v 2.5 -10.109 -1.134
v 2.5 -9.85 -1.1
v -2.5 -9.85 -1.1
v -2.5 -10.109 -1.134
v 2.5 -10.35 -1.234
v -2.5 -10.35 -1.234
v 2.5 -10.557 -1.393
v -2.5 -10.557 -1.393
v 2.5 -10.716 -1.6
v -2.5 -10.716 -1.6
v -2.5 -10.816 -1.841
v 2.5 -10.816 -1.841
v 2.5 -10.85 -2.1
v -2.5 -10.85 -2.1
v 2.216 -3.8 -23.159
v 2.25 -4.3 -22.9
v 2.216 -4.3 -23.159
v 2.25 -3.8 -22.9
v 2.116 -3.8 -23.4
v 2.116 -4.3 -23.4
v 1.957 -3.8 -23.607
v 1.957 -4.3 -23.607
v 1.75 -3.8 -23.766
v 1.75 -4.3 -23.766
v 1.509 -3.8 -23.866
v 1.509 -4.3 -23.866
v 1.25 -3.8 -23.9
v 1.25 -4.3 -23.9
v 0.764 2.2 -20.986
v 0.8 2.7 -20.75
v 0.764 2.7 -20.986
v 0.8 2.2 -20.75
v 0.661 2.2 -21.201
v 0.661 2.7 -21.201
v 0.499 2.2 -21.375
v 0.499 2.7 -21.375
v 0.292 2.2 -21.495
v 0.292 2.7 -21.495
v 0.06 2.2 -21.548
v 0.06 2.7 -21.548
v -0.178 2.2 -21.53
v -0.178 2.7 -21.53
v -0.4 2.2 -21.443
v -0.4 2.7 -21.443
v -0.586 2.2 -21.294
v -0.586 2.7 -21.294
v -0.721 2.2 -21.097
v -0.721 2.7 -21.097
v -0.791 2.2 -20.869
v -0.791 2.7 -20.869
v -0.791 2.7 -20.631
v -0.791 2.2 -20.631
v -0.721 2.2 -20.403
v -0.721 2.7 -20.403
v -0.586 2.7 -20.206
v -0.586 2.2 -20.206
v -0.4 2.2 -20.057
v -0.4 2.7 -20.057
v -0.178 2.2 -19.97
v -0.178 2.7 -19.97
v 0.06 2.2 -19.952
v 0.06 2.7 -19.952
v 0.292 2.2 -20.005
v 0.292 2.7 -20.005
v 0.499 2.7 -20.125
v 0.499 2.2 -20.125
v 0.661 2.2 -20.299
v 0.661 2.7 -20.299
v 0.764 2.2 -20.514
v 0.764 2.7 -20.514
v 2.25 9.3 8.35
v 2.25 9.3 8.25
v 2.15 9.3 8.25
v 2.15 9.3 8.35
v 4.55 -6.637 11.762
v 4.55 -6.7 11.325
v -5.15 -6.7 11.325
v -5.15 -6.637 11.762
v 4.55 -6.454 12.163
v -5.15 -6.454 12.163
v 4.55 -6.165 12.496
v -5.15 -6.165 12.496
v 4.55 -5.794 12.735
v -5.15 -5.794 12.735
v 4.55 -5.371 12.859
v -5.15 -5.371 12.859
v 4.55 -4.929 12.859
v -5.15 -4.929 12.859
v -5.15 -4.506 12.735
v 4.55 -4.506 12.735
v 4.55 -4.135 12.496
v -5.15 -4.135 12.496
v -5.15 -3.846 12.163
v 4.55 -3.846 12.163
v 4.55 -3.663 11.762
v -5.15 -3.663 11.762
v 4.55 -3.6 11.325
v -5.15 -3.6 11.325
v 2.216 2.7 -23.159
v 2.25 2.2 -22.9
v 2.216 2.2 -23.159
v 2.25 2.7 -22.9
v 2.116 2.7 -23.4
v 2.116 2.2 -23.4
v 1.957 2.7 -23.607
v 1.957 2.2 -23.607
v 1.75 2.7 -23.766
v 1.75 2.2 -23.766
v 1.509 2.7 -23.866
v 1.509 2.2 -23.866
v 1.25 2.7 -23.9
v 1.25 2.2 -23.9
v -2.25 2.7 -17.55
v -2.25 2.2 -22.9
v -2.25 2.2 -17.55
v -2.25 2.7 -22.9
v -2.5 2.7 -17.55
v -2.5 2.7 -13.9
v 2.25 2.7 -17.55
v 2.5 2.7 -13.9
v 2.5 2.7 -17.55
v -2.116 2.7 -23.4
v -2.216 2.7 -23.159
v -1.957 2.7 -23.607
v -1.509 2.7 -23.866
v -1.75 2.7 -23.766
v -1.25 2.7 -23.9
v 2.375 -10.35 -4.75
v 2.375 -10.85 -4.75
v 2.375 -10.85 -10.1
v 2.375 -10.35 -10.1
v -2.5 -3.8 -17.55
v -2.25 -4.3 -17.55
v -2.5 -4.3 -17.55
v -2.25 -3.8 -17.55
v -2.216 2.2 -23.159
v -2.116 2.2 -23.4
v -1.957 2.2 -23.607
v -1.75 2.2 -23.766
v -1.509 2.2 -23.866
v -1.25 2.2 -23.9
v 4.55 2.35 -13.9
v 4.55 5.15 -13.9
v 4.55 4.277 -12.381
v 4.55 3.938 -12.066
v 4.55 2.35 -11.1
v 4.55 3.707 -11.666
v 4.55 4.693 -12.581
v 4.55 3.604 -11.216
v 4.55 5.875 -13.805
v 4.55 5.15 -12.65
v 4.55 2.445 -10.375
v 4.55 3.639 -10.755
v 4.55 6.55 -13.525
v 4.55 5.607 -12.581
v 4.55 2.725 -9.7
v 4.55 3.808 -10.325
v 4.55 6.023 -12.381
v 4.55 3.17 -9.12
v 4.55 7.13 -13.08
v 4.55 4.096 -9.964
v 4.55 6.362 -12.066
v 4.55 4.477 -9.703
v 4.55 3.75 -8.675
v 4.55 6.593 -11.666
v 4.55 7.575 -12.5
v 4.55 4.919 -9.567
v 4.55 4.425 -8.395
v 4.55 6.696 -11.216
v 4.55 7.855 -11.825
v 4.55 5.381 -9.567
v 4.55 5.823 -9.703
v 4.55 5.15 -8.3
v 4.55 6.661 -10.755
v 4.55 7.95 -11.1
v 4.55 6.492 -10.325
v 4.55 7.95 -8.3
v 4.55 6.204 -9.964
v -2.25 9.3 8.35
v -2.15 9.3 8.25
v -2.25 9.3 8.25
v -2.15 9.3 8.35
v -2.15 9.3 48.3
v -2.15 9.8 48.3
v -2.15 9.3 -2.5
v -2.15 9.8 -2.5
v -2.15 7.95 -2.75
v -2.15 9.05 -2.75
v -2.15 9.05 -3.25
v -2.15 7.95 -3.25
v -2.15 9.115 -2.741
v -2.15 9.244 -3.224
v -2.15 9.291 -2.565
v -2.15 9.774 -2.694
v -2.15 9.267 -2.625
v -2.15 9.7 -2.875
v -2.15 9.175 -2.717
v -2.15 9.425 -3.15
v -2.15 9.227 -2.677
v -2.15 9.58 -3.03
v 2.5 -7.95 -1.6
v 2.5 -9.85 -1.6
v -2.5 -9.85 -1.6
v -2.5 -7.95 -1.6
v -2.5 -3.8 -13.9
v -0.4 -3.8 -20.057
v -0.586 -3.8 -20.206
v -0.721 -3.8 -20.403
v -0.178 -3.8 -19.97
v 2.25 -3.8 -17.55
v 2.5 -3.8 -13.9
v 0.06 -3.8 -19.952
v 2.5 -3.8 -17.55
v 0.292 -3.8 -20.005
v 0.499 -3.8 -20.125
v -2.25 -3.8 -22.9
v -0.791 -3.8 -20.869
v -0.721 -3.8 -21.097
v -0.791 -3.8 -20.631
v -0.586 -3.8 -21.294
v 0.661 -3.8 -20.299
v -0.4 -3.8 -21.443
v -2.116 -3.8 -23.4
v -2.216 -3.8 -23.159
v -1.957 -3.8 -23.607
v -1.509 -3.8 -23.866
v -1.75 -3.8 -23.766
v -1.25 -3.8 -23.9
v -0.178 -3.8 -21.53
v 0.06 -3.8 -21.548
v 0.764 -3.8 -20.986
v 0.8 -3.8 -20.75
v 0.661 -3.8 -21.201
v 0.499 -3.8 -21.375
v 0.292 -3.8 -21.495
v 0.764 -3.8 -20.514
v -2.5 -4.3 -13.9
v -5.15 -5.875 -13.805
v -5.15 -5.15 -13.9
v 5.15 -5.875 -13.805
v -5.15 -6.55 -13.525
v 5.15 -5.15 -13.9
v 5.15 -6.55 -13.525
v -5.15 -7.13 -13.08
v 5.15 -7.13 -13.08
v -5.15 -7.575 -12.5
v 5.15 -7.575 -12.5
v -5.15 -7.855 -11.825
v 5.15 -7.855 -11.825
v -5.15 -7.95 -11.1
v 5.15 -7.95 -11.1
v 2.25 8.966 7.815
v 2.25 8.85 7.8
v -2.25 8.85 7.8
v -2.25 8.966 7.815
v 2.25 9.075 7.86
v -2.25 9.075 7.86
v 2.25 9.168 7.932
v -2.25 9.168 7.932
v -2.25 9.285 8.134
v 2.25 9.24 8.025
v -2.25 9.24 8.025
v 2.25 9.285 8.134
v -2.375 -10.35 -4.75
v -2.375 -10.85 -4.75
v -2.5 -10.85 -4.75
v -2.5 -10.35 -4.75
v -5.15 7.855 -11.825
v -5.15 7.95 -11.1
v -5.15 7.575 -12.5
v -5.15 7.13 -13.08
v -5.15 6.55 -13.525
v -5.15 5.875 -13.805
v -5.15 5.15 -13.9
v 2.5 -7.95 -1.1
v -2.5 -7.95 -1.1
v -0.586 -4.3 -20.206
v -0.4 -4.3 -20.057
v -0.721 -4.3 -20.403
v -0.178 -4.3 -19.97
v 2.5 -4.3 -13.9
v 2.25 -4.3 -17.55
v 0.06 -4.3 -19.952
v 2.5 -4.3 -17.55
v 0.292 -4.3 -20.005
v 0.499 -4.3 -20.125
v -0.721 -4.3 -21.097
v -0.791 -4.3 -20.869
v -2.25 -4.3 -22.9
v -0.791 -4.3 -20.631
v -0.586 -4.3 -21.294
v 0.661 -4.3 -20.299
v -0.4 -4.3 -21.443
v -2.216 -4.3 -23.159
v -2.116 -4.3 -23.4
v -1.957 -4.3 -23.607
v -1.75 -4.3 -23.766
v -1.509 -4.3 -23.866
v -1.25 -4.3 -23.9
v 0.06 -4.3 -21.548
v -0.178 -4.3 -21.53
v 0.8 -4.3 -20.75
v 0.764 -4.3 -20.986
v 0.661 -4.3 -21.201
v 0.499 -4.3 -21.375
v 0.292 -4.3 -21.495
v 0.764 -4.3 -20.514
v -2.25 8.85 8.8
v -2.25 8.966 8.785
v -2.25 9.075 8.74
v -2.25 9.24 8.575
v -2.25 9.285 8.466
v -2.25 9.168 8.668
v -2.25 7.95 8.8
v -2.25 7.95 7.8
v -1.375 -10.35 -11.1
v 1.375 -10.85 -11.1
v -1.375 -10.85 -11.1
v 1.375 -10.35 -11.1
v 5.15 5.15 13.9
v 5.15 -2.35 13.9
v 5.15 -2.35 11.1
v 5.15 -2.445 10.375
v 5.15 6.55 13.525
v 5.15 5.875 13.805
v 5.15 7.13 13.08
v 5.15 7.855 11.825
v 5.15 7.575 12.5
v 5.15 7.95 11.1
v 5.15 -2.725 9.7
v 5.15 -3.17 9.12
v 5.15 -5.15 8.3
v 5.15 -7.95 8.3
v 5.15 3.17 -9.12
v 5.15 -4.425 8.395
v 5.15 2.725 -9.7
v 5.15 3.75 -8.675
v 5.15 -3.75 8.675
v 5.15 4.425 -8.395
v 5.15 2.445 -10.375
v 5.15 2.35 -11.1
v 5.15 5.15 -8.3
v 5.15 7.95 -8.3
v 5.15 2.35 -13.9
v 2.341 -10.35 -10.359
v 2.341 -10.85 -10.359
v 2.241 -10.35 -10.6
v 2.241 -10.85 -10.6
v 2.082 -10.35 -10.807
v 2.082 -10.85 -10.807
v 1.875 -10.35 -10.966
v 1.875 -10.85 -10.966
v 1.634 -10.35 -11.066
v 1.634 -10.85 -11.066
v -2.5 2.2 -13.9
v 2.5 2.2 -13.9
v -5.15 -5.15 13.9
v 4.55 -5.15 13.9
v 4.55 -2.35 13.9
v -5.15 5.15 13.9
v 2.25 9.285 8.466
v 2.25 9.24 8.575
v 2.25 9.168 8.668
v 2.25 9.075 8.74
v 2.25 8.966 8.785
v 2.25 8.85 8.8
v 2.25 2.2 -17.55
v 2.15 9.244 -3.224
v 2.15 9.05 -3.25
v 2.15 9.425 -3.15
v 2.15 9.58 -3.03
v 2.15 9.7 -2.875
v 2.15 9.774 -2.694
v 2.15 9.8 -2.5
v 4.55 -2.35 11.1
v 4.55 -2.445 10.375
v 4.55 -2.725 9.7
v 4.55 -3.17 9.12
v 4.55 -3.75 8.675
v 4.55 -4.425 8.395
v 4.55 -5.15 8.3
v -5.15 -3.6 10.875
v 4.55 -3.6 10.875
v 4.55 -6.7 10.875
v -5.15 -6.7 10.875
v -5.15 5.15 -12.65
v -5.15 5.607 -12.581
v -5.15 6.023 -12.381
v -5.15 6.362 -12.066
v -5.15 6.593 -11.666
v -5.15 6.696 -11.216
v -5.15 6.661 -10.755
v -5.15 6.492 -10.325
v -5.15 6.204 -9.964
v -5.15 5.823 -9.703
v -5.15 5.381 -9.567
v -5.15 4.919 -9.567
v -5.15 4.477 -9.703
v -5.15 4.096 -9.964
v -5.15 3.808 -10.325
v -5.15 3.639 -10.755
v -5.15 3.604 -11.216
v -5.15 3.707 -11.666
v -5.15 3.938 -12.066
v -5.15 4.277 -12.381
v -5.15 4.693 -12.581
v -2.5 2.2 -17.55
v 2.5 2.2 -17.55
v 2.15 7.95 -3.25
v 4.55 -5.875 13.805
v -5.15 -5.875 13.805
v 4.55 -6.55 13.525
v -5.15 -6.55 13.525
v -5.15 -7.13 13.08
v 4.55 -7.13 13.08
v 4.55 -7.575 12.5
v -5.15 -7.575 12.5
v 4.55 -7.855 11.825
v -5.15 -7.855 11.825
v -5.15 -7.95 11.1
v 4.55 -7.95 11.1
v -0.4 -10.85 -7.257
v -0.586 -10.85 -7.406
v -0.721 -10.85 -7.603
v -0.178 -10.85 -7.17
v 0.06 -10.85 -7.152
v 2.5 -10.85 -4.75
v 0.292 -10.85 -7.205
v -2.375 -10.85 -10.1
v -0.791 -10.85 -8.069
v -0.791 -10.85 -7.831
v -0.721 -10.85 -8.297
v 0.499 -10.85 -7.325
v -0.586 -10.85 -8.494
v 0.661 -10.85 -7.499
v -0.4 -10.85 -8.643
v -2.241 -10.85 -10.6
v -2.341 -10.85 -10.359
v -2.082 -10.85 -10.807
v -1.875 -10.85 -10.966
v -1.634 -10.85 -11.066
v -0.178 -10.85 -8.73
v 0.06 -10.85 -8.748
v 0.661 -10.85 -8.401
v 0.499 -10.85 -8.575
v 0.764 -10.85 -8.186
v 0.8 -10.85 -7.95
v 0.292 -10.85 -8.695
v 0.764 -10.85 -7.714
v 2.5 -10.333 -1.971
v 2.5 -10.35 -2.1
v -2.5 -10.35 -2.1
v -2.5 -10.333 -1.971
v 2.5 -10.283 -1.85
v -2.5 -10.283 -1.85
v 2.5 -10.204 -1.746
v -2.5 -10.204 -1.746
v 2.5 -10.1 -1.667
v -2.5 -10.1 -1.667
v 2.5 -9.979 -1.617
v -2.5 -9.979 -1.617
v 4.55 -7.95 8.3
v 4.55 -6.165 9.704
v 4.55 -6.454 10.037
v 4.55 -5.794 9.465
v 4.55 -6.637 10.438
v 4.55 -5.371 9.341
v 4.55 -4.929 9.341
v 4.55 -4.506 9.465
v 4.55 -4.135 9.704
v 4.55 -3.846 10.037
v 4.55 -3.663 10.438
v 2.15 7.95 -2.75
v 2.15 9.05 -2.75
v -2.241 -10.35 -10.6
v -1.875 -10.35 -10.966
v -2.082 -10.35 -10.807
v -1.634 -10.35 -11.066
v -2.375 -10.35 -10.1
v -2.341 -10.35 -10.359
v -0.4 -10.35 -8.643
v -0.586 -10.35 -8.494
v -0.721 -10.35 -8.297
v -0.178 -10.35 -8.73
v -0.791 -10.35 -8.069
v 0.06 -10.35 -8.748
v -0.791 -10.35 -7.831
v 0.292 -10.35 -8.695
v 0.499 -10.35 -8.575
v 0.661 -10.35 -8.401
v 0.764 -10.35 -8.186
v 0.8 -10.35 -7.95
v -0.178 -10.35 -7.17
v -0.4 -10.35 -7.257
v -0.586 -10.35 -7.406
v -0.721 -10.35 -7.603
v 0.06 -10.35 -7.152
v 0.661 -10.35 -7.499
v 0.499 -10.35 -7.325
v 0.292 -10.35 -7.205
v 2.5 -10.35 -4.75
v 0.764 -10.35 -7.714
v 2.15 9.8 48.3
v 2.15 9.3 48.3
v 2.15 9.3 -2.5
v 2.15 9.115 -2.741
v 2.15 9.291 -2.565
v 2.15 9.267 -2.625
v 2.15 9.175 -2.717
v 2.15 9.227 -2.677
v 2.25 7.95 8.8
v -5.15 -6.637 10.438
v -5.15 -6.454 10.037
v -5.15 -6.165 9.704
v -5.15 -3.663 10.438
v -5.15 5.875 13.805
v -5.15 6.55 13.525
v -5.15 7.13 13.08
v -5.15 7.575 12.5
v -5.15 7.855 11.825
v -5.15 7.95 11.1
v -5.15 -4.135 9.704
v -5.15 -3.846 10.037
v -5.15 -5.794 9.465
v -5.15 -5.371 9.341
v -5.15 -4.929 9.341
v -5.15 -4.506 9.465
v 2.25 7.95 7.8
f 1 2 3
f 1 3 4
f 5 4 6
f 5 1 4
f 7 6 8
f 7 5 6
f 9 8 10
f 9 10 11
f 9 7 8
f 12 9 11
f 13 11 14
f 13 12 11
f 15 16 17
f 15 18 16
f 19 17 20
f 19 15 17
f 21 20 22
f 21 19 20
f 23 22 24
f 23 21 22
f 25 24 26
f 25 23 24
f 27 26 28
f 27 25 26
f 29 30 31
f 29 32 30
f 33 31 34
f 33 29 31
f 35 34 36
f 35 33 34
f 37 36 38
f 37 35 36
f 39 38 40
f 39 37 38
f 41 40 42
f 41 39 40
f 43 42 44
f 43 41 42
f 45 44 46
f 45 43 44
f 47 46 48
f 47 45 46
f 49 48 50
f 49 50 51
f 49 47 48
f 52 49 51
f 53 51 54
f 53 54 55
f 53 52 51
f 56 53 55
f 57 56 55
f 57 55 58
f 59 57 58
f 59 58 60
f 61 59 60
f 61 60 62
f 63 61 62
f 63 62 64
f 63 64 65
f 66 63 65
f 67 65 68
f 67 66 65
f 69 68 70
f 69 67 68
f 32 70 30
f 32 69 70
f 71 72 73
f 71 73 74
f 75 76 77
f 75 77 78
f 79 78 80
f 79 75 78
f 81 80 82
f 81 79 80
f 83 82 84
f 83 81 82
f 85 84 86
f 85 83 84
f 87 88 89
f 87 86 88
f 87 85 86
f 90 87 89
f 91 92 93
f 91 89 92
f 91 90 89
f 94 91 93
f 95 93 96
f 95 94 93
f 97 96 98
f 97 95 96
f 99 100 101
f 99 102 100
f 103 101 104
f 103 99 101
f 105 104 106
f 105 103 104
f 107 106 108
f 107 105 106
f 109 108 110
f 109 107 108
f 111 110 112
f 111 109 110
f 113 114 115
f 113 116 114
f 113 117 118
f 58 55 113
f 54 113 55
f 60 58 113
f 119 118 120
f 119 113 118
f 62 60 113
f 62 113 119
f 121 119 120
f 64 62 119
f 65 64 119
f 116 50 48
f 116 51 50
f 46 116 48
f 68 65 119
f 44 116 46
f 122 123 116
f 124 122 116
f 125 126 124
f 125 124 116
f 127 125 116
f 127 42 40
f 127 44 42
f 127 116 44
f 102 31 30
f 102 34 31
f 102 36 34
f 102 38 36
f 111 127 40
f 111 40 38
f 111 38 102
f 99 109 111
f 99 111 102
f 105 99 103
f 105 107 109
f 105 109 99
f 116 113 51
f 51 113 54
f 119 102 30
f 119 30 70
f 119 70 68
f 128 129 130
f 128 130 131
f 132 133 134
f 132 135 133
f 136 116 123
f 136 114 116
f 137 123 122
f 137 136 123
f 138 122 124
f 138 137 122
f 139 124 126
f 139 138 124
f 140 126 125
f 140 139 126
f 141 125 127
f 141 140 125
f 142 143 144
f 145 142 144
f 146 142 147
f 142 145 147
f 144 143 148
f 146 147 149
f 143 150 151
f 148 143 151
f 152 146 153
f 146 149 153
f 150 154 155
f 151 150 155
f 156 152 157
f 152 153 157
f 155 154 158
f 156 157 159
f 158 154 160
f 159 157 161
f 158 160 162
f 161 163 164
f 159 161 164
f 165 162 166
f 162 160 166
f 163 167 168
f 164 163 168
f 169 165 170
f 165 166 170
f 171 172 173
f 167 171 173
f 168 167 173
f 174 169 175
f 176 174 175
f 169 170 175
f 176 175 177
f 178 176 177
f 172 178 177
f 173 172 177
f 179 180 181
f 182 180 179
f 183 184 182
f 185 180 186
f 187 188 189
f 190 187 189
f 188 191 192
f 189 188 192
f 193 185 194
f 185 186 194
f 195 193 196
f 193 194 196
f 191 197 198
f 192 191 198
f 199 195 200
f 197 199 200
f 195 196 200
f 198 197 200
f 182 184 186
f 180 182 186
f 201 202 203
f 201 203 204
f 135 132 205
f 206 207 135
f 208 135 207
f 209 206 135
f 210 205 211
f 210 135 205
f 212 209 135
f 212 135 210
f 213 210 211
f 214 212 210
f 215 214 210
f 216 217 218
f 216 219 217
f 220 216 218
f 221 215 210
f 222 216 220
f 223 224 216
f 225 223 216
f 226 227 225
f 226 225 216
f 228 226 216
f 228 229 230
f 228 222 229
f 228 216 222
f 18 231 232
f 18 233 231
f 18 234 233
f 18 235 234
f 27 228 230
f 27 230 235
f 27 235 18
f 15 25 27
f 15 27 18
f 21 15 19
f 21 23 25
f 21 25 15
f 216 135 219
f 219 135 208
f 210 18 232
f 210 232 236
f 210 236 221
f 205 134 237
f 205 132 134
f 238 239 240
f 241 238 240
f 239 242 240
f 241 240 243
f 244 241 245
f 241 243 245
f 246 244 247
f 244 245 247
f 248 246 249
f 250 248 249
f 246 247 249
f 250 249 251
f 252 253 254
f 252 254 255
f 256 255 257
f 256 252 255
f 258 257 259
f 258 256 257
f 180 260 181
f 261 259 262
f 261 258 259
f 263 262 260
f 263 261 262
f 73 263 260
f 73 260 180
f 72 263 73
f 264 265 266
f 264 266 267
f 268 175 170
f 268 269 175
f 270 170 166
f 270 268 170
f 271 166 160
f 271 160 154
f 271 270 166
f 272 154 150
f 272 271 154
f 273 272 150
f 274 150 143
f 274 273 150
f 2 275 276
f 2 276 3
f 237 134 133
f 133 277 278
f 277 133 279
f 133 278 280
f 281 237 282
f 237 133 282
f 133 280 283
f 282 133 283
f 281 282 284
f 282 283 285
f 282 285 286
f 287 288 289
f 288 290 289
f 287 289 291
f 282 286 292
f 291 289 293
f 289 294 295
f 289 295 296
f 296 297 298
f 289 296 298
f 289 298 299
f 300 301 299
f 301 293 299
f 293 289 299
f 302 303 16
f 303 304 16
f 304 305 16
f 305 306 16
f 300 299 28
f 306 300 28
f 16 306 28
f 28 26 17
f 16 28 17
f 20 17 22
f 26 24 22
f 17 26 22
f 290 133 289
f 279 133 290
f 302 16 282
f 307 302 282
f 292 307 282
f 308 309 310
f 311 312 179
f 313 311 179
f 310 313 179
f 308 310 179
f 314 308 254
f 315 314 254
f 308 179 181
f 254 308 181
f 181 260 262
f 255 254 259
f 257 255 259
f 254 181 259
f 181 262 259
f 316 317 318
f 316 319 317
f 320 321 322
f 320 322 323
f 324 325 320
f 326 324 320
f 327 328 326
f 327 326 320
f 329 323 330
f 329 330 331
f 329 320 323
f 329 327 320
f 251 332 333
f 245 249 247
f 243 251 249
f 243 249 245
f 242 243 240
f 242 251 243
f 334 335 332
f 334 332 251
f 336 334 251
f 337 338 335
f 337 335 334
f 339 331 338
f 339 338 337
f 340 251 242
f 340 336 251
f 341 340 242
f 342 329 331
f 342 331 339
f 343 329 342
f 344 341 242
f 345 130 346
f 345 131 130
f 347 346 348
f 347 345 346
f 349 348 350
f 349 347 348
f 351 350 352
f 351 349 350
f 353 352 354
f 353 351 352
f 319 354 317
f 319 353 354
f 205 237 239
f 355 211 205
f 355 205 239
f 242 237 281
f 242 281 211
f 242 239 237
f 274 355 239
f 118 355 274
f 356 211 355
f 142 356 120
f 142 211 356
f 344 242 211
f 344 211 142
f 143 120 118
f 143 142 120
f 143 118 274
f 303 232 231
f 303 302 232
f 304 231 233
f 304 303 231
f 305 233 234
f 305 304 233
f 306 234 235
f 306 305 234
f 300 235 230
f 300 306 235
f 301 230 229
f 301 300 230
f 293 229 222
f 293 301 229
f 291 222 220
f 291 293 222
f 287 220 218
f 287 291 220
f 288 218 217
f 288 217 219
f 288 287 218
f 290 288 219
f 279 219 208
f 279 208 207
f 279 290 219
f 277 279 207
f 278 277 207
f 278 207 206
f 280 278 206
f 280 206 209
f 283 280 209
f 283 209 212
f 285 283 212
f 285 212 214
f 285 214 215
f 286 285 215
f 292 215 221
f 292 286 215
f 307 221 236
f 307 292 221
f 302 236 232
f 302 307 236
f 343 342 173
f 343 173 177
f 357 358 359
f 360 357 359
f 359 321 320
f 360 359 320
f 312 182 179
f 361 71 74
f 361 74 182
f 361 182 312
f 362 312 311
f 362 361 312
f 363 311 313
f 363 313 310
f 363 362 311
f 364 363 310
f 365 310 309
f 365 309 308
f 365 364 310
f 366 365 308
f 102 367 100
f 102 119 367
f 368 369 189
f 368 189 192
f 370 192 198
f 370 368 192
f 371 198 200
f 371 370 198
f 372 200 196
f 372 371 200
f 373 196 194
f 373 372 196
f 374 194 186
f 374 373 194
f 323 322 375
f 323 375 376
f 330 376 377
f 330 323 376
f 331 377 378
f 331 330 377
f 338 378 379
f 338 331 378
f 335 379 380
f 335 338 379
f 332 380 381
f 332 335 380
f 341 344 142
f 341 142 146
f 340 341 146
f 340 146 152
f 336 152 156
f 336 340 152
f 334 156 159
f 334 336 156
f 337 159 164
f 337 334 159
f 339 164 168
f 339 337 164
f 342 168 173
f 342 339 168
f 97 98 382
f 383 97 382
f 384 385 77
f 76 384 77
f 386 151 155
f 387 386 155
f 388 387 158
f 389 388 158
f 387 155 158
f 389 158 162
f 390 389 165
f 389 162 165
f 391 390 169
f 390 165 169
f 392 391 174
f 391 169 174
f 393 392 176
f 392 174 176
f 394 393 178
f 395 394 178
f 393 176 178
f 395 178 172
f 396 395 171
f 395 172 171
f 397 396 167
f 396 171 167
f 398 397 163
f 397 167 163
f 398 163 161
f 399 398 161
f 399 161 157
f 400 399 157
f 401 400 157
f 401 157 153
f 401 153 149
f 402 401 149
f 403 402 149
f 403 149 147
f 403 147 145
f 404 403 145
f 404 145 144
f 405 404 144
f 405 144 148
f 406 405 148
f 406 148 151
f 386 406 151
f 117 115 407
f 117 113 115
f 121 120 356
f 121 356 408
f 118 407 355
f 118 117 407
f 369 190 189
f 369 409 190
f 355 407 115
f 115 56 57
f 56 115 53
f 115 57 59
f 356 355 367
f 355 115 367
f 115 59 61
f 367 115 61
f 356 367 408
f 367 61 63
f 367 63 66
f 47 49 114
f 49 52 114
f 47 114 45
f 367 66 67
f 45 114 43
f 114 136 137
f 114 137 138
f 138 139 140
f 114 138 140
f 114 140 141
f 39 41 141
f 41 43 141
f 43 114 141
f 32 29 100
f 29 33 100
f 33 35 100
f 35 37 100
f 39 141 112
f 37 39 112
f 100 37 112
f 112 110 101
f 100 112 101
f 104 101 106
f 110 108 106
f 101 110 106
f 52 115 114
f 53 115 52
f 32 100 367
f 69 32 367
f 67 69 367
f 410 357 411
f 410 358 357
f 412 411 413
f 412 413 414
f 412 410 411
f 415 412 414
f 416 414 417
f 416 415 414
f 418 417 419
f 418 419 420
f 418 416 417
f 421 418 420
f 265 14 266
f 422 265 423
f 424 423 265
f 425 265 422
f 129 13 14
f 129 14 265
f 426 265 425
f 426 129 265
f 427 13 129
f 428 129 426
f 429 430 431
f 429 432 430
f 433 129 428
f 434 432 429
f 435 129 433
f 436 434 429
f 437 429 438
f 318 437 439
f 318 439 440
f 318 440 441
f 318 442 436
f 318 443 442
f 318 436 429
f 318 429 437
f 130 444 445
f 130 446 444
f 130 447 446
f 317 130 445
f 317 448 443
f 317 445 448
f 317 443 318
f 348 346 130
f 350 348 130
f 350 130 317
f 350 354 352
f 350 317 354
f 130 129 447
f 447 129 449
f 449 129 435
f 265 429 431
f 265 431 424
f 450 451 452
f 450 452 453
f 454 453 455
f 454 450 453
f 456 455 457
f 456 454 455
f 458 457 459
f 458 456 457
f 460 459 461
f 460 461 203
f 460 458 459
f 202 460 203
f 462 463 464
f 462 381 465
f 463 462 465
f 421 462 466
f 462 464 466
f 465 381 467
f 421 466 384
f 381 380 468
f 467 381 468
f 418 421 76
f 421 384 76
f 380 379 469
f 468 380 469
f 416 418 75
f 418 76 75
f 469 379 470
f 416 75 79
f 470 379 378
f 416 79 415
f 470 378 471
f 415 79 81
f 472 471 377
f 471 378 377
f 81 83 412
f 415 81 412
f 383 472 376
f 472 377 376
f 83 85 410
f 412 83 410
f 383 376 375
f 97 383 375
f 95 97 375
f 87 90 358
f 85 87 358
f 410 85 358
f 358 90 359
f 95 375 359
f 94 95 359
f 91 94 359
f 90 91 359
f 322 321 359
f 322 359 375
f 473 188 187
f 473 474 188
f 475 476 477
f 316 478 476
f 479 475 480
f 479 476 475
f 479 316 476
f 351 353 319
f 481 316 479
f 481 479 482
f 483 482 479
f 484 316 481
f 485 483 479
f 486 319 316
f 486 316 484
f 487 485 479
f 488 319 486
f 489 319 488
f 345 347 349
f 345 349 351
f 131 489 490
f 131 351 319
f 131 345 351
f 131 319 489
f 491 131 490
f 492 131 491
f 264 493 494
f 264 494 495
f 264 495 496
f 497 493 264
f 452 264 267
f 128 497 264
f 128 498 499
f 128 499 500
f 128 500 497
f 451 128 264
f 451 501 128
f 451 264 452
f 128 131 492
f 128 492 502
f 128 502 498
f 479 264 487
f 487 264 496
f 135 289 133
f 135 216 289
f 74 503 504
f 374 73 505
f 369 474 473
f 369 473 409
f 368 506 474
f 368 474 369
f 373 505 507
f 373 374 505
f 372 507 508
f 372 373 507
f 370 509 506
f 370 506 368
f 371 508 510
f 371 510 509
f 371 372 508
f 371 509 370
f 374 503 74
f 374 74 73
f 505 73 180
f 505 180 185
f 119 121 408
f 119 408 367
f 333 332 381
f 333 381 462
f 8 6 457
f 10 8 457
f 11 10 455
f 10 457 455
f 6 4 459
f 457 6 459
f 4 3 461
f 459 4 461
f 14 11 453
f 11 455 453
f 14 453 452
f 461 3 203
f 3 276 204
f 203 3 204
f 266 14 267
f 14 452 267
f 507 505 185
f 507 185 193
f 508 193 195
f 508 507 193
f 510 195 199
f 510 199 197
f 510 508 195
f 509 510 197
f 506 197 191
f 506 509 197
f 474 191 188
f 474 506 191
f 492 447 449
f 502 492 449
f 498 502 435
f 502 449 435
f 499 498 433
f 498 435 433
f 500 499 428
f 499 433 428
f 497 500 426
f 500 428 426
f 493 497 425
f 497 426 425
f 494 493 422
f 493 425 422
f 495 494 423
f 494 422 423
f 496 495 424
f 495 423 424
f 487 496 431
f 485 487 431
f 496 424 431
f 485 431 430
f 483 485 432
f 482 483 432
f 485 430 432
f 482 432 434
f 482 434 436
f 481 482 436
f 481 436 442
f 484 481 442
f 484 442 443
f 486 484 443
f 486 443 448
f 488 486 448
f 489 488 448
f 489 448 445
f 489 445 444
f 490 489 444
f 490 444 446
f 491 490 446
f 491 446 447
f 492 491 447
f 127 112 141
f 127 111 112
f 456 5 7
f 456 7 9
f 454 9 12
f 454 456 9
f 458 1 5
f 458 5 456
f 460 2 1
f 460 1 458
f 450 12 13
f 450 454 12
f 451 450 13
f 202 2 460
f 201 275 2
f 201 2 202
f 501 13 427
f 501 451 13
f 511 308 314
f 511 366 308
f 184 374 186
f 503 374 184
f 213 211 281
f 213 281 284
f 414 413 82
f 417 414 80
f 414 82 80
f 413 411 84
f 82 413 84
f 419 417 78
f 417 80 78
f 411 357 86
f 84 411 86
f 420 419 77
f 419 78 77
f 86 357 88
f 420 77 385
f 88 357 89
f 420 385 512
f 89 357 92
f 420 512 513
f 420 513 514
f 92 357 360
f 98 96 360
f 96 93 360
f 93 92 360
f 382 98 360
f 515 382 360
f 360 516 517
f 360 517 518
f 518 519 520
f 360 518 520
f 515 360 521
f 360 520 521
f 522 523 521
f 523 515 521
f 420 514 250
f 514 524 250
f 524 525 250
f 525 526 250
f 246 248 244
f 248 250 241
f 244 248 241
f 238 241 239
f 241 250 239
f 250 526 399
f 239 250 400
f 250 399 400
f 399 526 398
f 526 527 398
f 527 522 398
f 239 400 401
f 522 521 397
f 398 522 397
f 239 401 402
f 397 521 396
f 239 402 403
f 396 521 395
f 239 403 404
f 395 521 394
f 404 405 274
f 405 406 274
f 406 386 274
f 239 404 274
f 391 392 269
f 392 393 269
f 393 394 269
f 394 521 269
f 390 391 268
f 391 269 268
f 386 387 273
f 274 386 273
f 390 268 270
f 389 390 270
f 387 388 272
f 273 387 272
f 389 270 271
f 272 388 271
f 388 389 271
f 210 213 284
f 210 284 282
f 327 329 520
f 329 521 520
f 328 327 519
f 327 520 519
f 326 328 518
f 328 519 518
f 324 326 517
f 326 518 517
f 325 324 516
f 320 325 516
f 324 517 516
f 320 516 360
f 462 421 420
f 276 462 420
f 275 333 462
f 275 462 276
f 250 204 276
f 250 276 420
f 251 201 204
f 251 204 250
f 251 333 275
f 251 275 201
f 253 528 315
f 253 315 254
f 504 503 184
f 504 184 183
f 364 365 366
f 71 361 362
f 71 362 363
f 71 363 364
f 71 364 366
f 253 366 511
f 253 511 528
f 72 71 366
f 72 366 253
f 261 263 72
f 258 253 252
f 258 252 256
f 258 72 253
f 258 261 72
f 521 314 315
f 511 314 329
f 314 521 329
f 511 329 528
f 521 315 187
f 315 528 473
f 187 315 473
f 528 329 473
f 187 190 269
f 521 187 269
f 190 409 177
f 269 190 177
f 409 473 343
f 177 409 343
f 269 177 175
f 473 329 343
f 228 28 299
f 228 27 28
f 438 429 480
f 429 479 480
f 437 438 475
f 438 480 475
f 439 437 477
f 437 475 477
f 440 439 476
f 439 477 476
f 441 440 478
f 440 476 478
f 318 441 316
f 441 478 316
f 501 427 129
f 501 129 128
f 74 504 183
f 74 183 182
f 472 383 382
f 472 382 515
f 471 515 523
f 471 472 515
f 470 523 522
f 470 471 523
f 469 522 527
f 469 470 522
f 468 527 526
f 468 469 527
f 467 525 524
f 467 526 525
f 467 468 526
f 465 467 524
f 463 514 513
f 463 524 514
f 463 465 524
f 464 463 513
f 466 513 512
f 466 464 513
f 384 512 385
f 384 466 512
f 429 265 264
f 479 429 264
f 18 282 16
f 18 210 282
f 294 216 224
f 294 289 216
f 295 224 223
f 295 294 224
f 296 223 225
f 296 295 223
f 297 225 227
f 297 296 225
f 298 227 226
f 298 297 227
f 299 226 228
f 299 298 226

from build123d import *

# Parameters (mm, degrees)
SKETCH1_W           = 27.8
SKETCH1_H           = 15.9
BOSS_EXTRUDE1_DEPTH = 5.15
SKETCH4_R           = 1.55
CUT_EXTRUDE1_DEPTH  = 11.3
CUT_EXTRUDE2_DEPTH  = 0.6
SKETCH8_R           = 0.8
BOSS_EXTRUDE2_DEPTH = 0.25
LPATTERN1_COUNT     = 2
LPATTERN1_PITCH     = 6.5
BOSS_EXTRUDE3_DEPTH = 5
SKETCH10_W          = 4.75
SKETCH10_H          = 0.5
BOSS_EXTRUDE4_DEPTH = 6.35
CUT_EXTRUDE3_REACH  = 20.8
SKETCH11_R          = 0.8
BOSS_EXTRUDE5_DEPTH = 2.15
BOSS_EXTRUDE7_DEPTH = 2.25
FILLET1_R           = 2.8
FILLET2_R           = 1


with BuildPart() as part:
    # Sketch1 → Boss-Extrude1 (new body, symmetric)
    with BuildSketch(Plane(origin=(0, 0, 0), x_dir=(0, 0, -1), z_dir=(1, 0, 0))):
        Rectangle(SKETCH1_W, SKETCH1_H)
    extrude(amount=BOSS_EXTRUDE1_DEPTH, both=True)

    # Sketch4 → Cut-Extrude1 (cut, through all)
    with BuildSketch(Plane(origin=(5.15, 0, 0), x_dir=(0, 0, -1), z_dir=(1, 0, 0))):
        with Locations((11.1, 5.15)):
            Circle(SKETCH4_R)
        with BuildLine():
            Line((-11.325, -3.6), (-10.875, -3.6))
            ThreePointArc((-10.875, -3.6), (-9.325, -5.15), (-10.875, -6.7))
            Line((-10.875, -6.7), (-11.325, -6.7))
            ThreePointArc((-11.325, -6.7), (-12.875, -5.15), (-11.325, -3.6))
        make_face()
    extrude(amount=-CUT_EXTRUDE1_DEPTH, mode=Mode.SUBTRACT)

    # Sketch5 → Cut-Extrude2 (cut)
    with BuildSketch(Plane(origin=(5.15, 0, 0), x_dir=(0, 0, -1), z_dir=(1, 0, 0))):
        with BuildLine():
            Line((13.9, 2.35), (11.1, 2.35))
            ThreePointArc((11.1, 2.35), (9.120101013, 3.170101013), (8.3, 5.15))
            Line((8.3, 5.15), (8.3, 7.95))
            Line((8.3, 7.95), (13.9, 7.95))
            Line((13.9, 7.95), (13.9, 2.35))
        make_face()
        with BuildLine():
            Line((-13.9, -2.35), (-11.1, -2.35))
            ThreePointArc((-11.1, -2.35), (-9.120101013, -3.170101013), (-8.3, -5.15))
            Line((-8.3, -5.15), (-8.3, -7.95))
            Line((-8.3, -7.95), (-13.9, -7.95))
            Line((-13.9, -7.95), (-13.9, -2.35))
        make_face()
    extrude(amount=-CUT_EXTRUDE2_DEPTH, mode=Mode.SUBTRACT)

    # Sketch8 → Boss-Extrude2 (add, symmetric)
    with BuildSketch(Plane(origin=(0, 2.45, 0), x_dir=(1, 0, 0), z_dir=(0, 1, 0))):
        Polygon((-2.5, 13.9), (2.5, 13.9), (2.5, 17.55), (2.25, 17.55), (2.25, 23.9), (-2.25, 23.9), (-2.25, 17.55), (-2.5, 17.55), align=None)
        with Locations((0, 20.75)):
            Circle(SKETCH8_R, mode=Mode.SUBTRACT)
    boss_extrude2 = extrude(amount=BOSS_EXTRUDE2_DEPTH, both=True)

    # LPattern1: Boss-Extrude2 ×2
    with Locations(*[(0, -i * LPATTERN1_PITCH, 0) for i in range(1, LPATTERN1_COUNT)]):
        add(boss_extrude2)

    # Sketch9 → Boss-Extrude3 (add)
    with BuildSketch(Plane(origin=(2.5, 0, 0), x_dir=(0, 0, -1), z_dir=(1, 0, 0))):
        with BuildLine():
            Line((1.1, -7.95), (1.1, -9.85))
            ThreePointArc((1.1, -9.85), (1.392893219, -10.557106781), (2.1, -10.85))
            Line((2.1, -10.85), (4.75, -10.85))
            Line((4.75, -10.85), (4.75, -10.35))
            Line((4.75, -10.35), (2.1, -10.35))
            ThreePointArc((2.1, -10.35), (1.746446609, -10.203553391), (1.6, -9.85))
            Line((1.6, -9.85), (1.6, -7.95))
            Line((1.6, -7.95), (1.1, -7.95))
        make_face()
    extrude(amount=-BOSS_EXTRUDE3_DEPTH)

    # Sketch10 → Boss-Extrude4 (add)
    with BuildSketch(Plane(origin=(0, 0, -4.75), x_dir=(-1, 0, 0), z_dir=(0, 0, -1))):
        with Locations((0, -10.6)):
            Rectangle(SKETCH10_W, SKETCH10_H)
    extrude(amount=BOSS_EXTRUDE4_DEPTH)

    # Sketch11 → Cut-Extrude3 (cut, up to next)
    with BuildSketch(Plane.XZ.offset(10.85), mode=Mode.PRIVATE) as cut_extrude3_sk1:
        with Locations((0, -7.95)):
            Circle(SKETCH11_R)
    cut_extrude3_tool1 = extrude(cut_extrude3_sk1.sketch, amount=-CUT_EXTRUDE3_REACH, mode=Mode.PRIVATE) & part.part
    add(cut_extrude3_tool1.solids().sort_by_distance((0, -10.85, -7.95))[0], mode=Mode.SUBTRACT)

    # Sketch12 → Boss-Extrude5 (add, symmetric)
    with BuildSketch(Plane(origin=(0, 0, 0), x_dir=(0, 0, -1), z_dir=(1, 0, 0))):
        with BuildLine():
            Line((3.25, 7.95), (3.25, 9.05))
            ThreePointArc((3.25, 9.05), (3.030330086, 9.580330086), (2.5, 9.8))
            Line((2.5, 9.8), (-48.3, 9.8))
            Line((-48.3, 9.8), (-48.3, 9.3))
            Line((-48.3, 9.3), (2.5, 9.3))
            ThreePointArc((2.5, 9.3), (2.676776695, 9.226776695), (2.75, 9.05))
            Line((2.75, 9.05), (2.75, 7.95))
            Line((2.75, 7.95), (3.25, 7.95))
        make_face()
    extrude(amount=BOSS_EXTRUDE5_DEPTH, both=True)

    # Sketch13 → Boss-Extrude7 (add, symmetric)
    with BuildSketch(Plane(origin=(0, 0, 0), x_dir=(0, 0, -1), z_dir=(1, 0, 0))):
        with BuildLine():
            Line((-8.8, 8.85), (-8.8, 7.95))
            Line((-8.8, 7.95), (-7.8, 7.95))
            Line((-7.8, 7.95), (-7.8, 8.85))
            ThreePointArc((-7.8, 8.85), (-7.931801948, 9.168198052), (-8.25, 9.3))
            Line((-8.25, 9.3), (-8.35, 9.3))
            ThreePointArc((-8.35, 9.3), (-8.668198052, 9.168198052), (-8.8, 8.85))
        make_face()
    extrude(amount=BOSS_EXTRUDE7_DEPTH, both=True)

    # Fillet1
    fillet1_edges = [part.edges().sort_by_distance(p)[0] for p in [
        (-0.3, 7.95, -13.9),
        (-0.3, -7.95, 13.9),
        (0, -7.95, -13.9),
        (0, 7.95, 13.9),
    ]]
    fillet(fillet1_edges, radius=FILLET1_R)

    # Fillet2
    fillet2_edges = [part.edges().sort_by_distance(p)[0] for p in [
        (2.375, -10.6, -11.1),
        (-2.375, -10.6, -11.1),
        (2.25, -4.05, -23.9),
        (-2.25, -4.05, -23.9),
        (-2.25, 2.45, -23.9),
        (2.25, 2.45, -23.9),
    ]]
    fillet(fillet2_edges, radius=FILLET2_R)


solid = part.part
